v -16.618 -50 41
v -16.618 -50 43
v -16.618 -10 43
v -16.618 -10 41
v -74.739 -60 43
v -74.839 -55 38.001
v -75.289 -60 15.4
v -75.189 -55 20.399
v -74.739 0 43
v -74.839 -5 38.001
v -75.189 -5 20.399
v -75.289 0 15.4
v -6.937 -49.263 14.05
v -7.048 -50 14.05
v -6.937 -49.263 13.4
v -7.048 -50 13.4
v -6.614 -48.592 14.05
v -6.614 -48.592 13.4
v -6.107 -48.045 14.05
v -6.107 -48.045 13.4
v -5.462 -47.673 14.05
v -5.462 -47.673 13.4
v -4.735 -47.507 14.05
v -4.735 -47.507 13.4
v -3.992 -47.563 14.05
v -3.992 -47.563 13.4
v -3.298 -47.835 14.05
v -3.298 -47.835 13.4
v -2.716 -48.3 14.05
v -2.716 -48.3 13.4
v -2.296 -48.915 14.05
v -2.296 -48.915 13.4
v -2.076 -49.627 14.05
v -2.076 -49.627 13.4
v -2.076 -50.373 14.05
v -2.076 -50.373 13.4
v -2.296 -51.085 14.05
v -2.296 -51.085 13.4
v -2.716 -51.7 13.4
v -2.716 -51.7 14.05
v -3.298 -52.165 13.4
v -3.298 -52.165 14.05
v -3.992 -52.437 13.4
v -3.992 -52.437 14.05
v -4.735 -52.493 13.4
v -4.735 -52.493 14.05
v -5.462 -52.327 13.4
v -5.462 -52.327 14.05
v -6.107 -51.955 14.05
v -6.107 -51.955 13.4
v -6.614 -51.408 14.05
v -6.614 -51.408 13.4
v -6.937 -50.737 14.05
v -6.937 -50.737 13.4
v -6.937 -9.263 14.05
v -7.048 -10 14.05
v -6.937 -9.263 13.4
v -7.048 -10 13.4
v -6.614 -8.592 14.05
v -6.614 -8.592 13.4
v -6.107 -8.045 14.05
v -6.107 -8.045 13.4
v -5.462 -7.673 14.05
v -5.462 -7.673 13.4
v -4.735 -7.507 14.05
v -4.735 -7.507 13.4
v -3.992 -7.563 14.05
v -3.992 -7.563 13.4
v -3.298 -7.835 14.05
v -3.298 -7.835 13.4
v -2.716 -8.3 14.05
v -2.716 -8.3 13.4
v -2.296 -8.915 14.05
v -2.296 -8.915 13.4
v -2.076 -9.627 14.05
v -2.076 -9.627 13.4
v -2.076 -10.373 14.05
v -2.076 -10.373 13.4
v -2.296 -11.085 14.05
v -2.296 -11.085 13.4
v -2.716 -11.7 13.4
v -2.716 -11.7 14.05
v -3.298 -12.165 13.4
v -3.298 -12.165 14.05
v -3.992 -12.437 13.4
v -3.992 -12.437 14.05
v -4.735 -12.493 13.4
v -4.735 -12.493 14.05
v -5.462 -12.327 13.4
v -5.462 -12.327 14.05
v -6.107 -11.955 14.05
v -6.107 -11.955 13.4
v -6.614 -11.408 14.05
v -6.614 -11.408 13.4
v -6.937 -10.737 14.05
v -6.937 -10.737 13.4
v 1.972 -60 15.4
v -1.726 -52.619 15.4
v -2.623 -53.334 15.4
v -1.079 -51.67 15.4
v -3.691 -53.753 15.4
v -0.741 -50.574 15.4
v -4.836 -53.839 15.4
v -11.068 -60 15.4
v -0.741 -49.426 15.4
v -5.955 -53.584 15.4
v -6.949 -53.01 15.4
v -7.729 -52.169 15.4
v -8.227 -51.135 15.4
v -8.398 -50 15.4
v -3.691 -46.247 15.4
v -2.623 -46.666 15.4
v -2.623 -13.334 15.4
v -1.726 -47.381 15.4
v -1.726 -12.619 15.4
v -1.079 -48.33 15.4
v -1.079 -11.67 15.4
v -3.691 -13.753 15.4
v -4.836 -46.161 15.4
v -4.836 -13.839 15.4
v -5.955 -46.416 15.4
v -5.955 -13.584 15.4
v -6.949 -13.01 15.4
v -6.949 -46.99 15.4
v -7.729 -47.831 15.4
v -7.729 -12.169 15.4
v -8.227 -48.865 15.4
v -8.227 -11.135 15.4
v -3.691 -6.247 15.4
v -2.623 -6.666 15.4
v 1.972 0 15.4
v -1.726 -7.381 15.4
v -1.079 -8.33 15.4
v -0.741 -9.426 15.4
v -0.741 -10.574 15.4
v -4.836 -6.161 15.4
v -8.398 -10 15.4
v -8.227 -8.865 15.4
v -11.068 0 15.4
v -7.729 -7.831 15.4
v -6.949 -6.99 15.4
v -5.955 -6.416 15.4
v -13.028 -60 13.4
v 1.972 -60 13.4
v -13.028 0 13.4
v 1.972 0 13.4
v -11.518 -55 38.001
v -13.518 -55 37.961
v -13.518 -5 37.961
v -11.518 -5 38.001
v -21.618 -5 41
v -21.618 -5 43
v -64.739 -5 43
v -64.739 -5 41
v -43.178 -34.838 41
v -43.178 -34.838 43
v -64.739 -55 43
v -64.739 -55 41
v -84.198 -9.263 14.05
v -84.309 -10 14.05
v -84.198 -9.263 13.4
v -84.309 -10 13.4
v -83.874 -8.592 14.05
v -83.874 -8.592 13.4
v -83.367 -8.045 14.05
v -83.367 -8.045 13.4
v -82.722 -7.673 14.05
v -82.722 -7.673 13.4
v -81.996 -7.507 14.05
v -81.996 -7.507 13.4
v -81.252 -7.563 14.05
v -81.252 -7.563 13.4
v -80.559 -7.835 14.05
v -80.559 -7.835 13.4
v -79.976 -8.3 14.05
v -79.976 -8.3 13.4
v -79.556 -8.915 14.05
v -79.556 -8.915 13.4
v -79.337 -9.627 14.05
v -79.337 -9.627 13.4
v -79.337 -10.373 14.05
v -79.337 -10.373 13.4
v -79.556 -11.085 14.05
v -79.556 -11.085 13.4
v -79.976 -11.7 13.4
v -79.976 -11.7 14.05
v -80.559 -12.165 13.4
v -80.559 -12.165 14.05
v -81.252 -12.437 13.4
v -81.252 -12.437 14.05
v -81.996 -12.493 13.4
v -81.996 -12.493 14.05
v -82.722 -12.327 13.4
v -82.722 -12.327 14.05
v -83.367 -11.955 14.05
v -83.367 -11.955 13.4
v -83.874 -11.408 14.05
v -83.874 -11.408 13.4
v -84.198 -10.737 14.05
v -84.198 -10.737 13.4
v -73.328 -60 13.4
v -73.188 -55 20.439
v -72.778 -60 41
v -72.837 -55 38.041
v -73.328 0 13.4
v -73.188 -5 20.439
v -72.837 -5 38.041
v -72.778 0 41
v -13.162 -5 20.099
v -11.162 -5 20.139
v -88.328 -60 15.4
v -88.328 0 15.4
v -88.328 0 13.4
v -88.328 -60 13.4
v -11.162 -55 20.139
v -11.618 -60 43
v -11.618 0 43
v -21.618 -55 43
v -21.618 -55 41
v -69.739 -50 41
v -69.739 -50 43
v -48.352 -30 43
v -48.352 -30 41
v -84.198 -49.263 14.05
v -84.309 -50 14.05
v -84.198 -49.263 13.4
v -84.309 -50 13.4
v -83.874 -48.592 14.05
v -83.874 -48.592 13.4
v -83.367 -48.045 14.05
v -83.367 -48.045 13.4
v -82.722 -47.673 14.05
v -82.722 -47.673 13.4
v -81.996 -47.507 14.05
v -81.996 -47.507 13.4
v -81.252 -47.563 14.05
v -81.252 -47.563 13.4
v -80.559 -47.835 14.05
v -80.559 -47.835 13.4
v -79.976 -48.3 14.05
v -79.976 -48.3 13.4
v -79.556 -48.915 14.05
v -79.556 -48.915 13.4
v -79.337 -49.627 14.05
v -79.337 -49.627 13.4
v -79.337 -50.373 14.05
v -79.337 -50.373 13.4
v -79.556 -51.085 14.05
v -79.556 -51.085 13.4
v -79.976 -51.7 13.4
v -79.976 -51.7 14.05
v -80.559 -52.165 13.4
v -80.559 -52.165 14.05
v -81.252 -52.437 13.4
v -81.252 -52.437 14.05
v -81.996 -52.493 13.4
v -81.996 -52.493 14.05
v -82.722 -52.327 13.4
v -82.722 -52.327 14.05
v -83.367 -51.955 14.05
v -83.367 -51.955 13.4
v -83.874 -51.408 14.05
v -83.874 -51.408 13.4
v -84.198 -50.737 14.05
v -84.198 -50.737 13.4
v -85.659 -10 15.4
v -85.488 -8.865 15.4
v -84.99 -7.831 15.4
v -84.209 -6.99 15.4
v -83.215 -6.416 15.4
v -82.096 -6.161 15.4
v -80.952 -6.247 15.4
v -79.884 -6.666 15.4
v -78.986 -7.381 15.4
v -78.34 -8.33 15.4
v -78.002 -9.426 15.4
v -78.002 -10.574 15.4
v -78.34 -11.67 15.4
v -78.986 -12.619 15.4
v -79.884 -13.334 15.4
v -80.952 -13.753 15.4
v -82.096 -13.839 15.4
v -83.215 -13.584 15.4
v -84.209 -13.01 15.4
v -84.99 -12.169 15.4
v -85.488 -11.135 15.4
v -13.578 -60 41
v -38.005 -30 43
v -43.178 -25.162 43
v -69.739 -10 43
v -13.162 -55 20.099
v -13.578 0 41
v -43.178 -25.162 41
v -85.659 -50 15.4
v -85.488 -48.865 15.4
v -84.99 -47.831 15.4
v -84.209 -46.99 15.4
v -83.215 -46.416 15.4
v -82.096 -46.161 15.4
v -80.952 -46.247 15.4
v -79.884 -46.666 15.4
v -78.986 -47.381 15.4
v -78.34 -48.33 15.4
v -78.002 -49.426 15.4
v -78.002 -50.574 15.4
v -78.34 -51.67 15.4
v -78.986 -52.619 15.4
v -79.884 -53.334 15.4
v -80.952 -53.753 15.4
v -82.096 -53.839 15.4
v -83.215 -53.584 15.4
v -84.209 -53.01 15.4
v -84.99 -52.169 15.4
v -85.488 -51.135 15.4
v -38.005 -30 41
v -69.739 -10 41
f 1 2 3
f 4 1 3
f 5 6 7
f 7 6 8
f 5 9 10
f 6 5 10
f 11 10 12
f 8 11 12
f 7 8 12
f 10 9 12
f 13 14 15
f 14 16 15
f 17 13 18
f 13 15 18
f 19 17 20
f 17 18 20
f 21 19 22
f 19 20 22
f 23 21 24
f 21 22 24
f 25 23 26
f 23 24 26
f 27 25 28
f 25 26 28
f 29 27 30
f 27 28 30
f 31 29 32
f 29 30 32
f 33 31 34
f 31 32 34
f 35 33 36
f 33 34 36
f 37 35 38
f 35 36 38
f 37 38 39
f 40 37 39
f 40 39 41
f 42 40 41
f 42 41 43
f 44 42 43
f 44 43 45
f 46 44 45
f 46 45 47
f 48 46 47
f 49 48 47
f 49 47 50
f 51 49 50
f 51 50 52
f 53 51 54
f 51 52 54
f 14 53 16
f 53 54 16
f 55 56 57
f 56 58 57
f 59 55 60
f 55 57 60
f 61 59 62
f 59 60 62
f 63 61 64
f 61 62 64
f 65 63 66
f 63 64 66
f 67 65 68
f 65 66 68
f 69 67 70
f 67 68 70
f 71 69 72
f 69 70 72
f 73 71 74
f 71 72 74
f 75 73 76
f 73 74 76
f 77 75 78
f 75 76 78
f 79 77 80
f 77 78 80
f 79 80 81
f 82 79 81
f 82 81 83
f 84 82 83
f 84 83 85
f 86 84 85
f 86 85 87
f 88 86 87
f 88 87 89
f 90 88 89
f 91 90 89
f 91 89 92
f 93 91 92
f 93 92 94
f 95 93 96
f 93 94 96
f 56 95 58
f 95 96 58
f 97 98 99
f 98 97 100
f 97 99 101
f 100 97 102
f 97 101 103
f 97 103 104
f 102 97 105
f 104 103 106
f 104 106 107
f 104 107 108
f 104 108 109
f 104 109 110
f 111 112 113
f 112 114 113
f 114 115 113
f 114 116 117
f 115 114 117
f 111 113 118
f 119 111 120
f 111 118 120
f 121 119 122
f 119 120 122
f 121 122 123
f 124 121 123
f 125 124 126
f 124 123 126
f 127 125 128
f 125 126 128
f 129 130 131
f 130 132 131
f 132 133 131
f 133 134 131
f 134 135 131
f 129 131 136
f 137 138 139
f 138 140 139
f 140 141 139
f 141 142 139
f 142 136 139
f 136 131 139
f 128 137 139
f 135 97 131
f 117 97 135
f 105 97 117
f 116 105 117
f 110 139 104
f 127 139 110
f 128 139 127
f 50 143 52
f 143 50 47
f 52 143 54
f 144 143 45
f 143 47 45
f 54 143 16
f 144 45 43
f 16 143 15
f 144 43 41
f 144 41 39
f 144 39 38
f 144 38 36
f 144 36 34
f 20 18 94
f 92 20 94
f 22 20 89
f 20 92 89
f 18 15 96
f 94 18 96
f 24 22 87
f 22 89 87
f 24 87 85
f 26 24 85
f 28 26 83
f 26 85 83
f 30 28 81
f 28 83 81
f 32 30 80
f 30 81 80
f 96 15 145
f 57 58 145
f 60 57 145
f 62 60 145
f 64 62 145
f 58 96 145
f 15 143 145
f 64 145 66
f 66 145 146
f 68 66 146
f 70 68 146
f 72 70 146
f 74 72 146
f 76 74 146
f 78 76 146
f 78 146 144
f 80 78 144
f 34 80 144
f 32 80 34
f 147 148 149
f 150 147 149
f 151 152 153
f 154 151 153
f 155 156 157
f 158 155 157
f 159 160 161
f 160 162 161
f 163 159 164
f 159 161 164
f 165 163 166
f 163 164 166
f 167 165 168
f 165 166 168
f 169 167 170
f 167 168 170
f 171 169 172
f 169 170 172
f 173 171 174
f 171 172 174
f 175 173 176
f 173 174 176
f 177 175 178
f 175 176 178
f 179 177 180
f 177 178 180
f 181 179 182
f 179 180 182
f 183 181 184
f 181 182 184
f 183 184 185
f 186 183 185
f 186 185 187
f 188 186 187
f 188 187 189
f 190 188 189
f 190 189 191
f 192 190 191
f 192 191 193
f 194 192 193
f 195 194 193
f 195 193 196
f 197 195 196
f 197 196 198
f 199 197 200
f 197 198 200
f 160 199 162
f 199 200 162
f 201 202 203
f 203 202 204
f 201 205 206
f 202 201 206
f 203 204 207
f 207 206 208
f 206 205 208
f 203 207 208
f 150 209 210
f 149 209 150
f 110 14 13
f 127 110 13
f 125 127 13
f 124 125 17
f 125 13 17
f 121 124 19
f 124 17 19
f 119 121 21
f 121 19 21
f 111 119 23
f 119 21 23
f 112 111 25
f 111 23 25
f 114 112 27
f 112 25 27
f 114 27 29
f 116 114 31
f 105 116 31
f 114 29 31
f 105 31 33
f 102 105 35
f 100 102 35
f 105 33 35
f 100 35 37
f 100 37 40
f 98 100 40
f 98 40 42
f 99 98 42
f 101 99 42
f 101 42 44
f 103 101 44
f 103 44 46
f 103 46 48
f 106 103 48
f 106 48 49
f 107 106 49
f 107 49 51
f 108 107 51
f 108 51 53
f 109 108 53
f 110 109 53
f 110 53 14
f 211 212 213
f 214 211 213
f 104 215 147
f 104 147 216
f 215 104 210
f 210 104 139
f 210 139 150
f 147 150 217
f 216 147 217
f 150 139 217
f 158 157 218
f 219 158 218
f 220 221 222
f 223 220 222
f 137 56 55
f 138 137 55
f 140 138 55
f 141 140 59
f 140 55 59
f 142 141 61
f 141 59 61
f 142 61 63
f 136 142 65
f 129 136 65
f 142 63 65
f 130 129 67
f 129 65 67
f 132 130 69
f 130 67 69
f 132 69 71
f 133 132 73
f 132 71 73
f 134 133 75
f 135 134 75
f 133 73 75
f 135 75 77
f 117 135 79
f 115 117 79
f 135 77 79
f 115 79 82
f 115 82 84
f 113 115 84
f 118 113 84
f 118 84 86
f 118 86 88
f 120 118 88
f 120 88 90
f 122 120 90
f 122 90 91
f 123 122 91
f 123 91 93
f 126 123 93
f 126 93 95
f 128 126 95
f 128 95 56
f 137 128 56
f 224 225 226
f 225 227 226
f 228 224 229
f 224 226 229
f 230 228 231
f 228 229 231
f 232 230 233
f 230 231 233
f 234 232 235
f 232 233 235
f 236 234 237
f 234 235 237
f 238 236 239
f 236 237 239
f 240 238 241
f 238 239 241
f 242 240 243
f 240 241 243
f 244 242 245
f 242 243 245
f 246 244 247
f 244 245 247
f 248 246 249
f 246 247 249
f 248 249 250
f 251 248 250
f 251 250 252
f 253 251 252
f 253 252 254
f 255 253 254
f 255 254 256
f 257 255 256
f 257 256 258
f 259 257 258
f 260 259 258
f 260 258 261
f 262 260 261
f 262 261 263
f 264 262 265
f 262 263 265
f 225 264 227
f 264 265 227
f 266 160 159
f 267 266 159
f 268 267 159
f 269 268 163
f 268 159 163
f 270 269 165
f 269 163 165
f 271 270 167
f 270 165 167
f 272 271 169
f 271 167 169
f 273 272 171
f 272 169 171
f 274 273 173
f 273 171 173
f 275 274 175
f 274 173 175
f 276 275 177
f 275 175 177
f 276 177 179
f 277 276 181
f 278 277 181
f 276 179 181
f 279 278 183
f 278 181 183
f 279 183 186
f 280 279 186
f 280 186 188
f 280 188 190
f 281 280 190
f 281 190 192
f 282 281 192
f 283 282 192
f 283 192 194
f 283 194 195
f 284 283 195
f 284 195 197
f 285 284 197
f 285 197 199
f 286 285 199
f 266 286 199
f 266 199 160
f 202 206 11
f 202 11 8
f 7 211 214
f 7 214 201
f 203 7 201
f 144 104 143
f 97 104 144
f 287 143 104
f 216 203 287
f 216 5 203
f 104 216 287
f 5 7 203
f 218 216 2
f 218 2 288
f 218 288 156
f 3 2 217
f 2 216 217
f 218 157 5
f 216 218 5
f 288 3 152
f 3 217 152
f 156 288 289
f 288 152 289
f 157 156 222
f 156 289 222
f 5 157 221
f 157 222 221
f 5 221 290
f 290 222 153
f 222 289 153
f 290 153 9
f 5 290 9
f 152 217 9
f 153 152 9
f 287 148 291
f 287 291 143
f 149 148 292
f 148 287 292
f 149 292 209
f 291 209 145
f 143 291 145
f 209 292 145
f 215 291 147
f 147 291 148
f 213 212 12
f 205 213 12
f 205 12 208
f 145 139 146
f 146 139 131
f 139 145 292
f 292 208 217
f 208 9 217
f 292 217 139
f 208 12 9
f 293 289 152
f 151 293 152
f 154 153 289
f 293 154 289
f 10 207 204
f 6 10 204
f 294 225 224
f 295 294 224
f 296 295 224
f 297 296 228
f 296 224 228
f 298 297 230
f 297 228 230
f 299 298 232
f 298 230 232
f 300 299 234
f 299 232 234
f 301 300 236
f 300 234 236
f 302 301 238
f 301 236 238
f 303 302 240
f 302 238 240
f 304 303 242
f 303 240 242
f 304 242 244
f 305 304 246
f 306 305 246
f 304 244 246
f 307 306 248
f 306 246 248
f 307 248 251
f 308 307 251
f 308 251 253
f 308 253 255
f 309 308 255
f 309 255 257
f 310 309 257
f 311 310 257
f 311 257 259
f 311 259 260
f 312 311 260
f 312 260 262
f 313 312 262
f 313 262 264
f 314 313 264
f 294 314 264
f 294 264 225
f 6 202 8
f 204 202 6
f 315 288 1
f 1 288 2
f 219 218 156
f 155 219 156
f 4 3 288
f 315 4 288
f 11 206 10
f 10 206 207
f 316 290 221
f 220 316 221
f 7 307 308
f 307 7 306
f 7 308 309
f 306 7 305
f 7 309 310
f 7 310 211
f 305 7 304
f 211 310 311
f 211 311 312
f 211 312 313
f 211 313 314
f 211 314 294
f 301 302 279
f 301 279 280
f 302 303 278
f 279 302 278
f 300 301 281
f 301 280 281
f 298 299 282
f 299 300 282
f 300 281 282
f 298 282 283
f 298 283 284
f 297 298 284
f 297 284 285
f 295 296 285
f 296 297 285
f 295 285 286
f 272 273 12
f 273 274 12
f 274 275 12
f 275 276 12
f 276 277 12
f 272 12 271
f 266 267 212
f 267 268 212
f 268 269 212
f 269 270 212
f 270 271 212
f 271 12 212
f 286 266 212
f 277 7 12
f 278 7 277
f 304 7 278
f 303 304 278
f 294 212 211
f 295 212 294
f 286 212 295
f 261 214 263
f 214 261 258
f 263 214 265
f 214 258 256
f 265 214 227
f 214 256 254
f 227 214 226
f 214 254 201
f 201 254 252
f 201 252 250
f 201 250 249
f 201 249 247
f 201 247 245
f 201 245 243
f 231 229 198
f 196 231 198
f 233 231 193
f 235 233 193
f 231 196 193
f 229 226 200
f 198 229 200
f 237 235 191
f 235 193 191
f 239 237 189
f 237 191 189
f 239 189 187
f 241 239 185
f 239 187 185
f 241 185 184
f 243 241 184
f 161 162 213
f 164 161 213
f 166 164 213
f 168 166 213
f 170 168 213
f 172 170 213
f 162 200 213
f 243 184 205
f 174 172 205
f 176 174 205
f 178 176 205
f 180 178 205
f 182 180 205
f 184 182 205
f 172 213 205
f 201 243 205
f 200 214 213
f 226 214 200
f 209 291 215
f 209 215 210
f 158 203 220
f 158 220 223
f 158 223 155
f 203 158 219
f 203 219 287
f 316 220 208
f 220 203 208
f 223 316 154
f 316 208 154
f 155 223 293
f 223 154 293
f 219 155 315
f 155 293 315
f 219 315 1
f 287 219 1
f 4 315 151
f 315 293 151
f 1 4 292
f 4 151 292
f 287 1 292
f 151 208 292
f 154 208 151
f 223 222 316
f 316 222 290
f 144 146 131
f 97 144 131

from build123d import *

# Parameters (mm, degrees)
F1_DEPTH       = 60
F3_D           = 5
F3_CSINK_D     = 7.7
F3_CSINK_ANGLE = 90
F5_DEPTH       = 29.6009997154
F6_W           = 50
F6_H           = 17.8652722283
F7_W           = 50
F7_H           = 17.6054795285
F8_DEPTH       = 5


with BuildPart() as f1:
    # F0 (on Front) → F1 (new body)
    with BuildSketch(Plane.XZ):
        Polygon((-88.3284620883, 15.3996990994), (-88.3284620883, 13.399699384), (-73.3284620883, 13.399699384), (-72.7784620883, 40.999699384), (-13.5784620883, 40.999699384), (-13.0284620883, 13.399699384), (1.9715379117, 13.399699384), (1.9715379117, 15.3996990994), (-11.0679203725, 15.3996990994), (-11.6179203725, 42.9996990994), (-74.7390038042, 42.9996990994), (-75.2890038042, 15.3996990994), align=None)
    extrude(amount=F1_DEPTH)

    # F3 (through all)
    with Locations(Plane.XY.offset(15.3996990994)):
        with Locations((-81.8087329462, -10), (-81.8087329462, -50), (-4.5481912304, -50), (-4.5481912304, -10)):
            CounterSinkHole(F3_D / 2, F3_CSINK_D / 2, counter_sink_angle=F3_CSINK_ANGLE)

    # F4 (on face) → F5 (cut, through all)
    with BuildSketch(Plane.XY.offset(42.9996990994)):
        Polygon((-48.3518556123, -30), (-69.7390038042, -10), (-69.7390038042, -50), align=None)
        Polygon((-21.6179203725, -5), (-64.7390038042, -5), (-43.1784620883, -25.1621474003), align=None)
        Polygon((-16.6179203725, -50), (-16.6179203725, -10), (-38.0050685644, -30), align=None)
        Polygon((-43.1784620883, -34.8378525997), (-64.7390038042, -55), (-21.6179203725, -55), align=None)
    extrude(amount=-F5_DEPTH, mode=Mode.SUBTRACT)

    # F6 (on face) + F7 (on face) → F8 (cut, symmetric)
    with BuildSketch(Plane(origin=(-10.756770725, 0, -0.2143559384), x_dir=(0, 1, 0), z_dir=(0.9998015058, 0, 0.0199235807))):
        with Locations((-30, 29.2899983673)):
            Rectangle(F6_W, F6_H)
    with BuildSketch(Plane(origin=(-75.565874151, 0, 1.505841695), x_dir=(0, -1, 0), z_dir=(-0.9998015058, 0, 0.0199235807))):
        with Locations((30, 27.6993555667)):
            Rectangle(F7_W, F7_H)
    extrude(amount=F8_DEPTH, both=True, dir=(0.9998015058, 0, 0.0199235807), mode=Mode.SUBTRACT)


solid = f1.part
